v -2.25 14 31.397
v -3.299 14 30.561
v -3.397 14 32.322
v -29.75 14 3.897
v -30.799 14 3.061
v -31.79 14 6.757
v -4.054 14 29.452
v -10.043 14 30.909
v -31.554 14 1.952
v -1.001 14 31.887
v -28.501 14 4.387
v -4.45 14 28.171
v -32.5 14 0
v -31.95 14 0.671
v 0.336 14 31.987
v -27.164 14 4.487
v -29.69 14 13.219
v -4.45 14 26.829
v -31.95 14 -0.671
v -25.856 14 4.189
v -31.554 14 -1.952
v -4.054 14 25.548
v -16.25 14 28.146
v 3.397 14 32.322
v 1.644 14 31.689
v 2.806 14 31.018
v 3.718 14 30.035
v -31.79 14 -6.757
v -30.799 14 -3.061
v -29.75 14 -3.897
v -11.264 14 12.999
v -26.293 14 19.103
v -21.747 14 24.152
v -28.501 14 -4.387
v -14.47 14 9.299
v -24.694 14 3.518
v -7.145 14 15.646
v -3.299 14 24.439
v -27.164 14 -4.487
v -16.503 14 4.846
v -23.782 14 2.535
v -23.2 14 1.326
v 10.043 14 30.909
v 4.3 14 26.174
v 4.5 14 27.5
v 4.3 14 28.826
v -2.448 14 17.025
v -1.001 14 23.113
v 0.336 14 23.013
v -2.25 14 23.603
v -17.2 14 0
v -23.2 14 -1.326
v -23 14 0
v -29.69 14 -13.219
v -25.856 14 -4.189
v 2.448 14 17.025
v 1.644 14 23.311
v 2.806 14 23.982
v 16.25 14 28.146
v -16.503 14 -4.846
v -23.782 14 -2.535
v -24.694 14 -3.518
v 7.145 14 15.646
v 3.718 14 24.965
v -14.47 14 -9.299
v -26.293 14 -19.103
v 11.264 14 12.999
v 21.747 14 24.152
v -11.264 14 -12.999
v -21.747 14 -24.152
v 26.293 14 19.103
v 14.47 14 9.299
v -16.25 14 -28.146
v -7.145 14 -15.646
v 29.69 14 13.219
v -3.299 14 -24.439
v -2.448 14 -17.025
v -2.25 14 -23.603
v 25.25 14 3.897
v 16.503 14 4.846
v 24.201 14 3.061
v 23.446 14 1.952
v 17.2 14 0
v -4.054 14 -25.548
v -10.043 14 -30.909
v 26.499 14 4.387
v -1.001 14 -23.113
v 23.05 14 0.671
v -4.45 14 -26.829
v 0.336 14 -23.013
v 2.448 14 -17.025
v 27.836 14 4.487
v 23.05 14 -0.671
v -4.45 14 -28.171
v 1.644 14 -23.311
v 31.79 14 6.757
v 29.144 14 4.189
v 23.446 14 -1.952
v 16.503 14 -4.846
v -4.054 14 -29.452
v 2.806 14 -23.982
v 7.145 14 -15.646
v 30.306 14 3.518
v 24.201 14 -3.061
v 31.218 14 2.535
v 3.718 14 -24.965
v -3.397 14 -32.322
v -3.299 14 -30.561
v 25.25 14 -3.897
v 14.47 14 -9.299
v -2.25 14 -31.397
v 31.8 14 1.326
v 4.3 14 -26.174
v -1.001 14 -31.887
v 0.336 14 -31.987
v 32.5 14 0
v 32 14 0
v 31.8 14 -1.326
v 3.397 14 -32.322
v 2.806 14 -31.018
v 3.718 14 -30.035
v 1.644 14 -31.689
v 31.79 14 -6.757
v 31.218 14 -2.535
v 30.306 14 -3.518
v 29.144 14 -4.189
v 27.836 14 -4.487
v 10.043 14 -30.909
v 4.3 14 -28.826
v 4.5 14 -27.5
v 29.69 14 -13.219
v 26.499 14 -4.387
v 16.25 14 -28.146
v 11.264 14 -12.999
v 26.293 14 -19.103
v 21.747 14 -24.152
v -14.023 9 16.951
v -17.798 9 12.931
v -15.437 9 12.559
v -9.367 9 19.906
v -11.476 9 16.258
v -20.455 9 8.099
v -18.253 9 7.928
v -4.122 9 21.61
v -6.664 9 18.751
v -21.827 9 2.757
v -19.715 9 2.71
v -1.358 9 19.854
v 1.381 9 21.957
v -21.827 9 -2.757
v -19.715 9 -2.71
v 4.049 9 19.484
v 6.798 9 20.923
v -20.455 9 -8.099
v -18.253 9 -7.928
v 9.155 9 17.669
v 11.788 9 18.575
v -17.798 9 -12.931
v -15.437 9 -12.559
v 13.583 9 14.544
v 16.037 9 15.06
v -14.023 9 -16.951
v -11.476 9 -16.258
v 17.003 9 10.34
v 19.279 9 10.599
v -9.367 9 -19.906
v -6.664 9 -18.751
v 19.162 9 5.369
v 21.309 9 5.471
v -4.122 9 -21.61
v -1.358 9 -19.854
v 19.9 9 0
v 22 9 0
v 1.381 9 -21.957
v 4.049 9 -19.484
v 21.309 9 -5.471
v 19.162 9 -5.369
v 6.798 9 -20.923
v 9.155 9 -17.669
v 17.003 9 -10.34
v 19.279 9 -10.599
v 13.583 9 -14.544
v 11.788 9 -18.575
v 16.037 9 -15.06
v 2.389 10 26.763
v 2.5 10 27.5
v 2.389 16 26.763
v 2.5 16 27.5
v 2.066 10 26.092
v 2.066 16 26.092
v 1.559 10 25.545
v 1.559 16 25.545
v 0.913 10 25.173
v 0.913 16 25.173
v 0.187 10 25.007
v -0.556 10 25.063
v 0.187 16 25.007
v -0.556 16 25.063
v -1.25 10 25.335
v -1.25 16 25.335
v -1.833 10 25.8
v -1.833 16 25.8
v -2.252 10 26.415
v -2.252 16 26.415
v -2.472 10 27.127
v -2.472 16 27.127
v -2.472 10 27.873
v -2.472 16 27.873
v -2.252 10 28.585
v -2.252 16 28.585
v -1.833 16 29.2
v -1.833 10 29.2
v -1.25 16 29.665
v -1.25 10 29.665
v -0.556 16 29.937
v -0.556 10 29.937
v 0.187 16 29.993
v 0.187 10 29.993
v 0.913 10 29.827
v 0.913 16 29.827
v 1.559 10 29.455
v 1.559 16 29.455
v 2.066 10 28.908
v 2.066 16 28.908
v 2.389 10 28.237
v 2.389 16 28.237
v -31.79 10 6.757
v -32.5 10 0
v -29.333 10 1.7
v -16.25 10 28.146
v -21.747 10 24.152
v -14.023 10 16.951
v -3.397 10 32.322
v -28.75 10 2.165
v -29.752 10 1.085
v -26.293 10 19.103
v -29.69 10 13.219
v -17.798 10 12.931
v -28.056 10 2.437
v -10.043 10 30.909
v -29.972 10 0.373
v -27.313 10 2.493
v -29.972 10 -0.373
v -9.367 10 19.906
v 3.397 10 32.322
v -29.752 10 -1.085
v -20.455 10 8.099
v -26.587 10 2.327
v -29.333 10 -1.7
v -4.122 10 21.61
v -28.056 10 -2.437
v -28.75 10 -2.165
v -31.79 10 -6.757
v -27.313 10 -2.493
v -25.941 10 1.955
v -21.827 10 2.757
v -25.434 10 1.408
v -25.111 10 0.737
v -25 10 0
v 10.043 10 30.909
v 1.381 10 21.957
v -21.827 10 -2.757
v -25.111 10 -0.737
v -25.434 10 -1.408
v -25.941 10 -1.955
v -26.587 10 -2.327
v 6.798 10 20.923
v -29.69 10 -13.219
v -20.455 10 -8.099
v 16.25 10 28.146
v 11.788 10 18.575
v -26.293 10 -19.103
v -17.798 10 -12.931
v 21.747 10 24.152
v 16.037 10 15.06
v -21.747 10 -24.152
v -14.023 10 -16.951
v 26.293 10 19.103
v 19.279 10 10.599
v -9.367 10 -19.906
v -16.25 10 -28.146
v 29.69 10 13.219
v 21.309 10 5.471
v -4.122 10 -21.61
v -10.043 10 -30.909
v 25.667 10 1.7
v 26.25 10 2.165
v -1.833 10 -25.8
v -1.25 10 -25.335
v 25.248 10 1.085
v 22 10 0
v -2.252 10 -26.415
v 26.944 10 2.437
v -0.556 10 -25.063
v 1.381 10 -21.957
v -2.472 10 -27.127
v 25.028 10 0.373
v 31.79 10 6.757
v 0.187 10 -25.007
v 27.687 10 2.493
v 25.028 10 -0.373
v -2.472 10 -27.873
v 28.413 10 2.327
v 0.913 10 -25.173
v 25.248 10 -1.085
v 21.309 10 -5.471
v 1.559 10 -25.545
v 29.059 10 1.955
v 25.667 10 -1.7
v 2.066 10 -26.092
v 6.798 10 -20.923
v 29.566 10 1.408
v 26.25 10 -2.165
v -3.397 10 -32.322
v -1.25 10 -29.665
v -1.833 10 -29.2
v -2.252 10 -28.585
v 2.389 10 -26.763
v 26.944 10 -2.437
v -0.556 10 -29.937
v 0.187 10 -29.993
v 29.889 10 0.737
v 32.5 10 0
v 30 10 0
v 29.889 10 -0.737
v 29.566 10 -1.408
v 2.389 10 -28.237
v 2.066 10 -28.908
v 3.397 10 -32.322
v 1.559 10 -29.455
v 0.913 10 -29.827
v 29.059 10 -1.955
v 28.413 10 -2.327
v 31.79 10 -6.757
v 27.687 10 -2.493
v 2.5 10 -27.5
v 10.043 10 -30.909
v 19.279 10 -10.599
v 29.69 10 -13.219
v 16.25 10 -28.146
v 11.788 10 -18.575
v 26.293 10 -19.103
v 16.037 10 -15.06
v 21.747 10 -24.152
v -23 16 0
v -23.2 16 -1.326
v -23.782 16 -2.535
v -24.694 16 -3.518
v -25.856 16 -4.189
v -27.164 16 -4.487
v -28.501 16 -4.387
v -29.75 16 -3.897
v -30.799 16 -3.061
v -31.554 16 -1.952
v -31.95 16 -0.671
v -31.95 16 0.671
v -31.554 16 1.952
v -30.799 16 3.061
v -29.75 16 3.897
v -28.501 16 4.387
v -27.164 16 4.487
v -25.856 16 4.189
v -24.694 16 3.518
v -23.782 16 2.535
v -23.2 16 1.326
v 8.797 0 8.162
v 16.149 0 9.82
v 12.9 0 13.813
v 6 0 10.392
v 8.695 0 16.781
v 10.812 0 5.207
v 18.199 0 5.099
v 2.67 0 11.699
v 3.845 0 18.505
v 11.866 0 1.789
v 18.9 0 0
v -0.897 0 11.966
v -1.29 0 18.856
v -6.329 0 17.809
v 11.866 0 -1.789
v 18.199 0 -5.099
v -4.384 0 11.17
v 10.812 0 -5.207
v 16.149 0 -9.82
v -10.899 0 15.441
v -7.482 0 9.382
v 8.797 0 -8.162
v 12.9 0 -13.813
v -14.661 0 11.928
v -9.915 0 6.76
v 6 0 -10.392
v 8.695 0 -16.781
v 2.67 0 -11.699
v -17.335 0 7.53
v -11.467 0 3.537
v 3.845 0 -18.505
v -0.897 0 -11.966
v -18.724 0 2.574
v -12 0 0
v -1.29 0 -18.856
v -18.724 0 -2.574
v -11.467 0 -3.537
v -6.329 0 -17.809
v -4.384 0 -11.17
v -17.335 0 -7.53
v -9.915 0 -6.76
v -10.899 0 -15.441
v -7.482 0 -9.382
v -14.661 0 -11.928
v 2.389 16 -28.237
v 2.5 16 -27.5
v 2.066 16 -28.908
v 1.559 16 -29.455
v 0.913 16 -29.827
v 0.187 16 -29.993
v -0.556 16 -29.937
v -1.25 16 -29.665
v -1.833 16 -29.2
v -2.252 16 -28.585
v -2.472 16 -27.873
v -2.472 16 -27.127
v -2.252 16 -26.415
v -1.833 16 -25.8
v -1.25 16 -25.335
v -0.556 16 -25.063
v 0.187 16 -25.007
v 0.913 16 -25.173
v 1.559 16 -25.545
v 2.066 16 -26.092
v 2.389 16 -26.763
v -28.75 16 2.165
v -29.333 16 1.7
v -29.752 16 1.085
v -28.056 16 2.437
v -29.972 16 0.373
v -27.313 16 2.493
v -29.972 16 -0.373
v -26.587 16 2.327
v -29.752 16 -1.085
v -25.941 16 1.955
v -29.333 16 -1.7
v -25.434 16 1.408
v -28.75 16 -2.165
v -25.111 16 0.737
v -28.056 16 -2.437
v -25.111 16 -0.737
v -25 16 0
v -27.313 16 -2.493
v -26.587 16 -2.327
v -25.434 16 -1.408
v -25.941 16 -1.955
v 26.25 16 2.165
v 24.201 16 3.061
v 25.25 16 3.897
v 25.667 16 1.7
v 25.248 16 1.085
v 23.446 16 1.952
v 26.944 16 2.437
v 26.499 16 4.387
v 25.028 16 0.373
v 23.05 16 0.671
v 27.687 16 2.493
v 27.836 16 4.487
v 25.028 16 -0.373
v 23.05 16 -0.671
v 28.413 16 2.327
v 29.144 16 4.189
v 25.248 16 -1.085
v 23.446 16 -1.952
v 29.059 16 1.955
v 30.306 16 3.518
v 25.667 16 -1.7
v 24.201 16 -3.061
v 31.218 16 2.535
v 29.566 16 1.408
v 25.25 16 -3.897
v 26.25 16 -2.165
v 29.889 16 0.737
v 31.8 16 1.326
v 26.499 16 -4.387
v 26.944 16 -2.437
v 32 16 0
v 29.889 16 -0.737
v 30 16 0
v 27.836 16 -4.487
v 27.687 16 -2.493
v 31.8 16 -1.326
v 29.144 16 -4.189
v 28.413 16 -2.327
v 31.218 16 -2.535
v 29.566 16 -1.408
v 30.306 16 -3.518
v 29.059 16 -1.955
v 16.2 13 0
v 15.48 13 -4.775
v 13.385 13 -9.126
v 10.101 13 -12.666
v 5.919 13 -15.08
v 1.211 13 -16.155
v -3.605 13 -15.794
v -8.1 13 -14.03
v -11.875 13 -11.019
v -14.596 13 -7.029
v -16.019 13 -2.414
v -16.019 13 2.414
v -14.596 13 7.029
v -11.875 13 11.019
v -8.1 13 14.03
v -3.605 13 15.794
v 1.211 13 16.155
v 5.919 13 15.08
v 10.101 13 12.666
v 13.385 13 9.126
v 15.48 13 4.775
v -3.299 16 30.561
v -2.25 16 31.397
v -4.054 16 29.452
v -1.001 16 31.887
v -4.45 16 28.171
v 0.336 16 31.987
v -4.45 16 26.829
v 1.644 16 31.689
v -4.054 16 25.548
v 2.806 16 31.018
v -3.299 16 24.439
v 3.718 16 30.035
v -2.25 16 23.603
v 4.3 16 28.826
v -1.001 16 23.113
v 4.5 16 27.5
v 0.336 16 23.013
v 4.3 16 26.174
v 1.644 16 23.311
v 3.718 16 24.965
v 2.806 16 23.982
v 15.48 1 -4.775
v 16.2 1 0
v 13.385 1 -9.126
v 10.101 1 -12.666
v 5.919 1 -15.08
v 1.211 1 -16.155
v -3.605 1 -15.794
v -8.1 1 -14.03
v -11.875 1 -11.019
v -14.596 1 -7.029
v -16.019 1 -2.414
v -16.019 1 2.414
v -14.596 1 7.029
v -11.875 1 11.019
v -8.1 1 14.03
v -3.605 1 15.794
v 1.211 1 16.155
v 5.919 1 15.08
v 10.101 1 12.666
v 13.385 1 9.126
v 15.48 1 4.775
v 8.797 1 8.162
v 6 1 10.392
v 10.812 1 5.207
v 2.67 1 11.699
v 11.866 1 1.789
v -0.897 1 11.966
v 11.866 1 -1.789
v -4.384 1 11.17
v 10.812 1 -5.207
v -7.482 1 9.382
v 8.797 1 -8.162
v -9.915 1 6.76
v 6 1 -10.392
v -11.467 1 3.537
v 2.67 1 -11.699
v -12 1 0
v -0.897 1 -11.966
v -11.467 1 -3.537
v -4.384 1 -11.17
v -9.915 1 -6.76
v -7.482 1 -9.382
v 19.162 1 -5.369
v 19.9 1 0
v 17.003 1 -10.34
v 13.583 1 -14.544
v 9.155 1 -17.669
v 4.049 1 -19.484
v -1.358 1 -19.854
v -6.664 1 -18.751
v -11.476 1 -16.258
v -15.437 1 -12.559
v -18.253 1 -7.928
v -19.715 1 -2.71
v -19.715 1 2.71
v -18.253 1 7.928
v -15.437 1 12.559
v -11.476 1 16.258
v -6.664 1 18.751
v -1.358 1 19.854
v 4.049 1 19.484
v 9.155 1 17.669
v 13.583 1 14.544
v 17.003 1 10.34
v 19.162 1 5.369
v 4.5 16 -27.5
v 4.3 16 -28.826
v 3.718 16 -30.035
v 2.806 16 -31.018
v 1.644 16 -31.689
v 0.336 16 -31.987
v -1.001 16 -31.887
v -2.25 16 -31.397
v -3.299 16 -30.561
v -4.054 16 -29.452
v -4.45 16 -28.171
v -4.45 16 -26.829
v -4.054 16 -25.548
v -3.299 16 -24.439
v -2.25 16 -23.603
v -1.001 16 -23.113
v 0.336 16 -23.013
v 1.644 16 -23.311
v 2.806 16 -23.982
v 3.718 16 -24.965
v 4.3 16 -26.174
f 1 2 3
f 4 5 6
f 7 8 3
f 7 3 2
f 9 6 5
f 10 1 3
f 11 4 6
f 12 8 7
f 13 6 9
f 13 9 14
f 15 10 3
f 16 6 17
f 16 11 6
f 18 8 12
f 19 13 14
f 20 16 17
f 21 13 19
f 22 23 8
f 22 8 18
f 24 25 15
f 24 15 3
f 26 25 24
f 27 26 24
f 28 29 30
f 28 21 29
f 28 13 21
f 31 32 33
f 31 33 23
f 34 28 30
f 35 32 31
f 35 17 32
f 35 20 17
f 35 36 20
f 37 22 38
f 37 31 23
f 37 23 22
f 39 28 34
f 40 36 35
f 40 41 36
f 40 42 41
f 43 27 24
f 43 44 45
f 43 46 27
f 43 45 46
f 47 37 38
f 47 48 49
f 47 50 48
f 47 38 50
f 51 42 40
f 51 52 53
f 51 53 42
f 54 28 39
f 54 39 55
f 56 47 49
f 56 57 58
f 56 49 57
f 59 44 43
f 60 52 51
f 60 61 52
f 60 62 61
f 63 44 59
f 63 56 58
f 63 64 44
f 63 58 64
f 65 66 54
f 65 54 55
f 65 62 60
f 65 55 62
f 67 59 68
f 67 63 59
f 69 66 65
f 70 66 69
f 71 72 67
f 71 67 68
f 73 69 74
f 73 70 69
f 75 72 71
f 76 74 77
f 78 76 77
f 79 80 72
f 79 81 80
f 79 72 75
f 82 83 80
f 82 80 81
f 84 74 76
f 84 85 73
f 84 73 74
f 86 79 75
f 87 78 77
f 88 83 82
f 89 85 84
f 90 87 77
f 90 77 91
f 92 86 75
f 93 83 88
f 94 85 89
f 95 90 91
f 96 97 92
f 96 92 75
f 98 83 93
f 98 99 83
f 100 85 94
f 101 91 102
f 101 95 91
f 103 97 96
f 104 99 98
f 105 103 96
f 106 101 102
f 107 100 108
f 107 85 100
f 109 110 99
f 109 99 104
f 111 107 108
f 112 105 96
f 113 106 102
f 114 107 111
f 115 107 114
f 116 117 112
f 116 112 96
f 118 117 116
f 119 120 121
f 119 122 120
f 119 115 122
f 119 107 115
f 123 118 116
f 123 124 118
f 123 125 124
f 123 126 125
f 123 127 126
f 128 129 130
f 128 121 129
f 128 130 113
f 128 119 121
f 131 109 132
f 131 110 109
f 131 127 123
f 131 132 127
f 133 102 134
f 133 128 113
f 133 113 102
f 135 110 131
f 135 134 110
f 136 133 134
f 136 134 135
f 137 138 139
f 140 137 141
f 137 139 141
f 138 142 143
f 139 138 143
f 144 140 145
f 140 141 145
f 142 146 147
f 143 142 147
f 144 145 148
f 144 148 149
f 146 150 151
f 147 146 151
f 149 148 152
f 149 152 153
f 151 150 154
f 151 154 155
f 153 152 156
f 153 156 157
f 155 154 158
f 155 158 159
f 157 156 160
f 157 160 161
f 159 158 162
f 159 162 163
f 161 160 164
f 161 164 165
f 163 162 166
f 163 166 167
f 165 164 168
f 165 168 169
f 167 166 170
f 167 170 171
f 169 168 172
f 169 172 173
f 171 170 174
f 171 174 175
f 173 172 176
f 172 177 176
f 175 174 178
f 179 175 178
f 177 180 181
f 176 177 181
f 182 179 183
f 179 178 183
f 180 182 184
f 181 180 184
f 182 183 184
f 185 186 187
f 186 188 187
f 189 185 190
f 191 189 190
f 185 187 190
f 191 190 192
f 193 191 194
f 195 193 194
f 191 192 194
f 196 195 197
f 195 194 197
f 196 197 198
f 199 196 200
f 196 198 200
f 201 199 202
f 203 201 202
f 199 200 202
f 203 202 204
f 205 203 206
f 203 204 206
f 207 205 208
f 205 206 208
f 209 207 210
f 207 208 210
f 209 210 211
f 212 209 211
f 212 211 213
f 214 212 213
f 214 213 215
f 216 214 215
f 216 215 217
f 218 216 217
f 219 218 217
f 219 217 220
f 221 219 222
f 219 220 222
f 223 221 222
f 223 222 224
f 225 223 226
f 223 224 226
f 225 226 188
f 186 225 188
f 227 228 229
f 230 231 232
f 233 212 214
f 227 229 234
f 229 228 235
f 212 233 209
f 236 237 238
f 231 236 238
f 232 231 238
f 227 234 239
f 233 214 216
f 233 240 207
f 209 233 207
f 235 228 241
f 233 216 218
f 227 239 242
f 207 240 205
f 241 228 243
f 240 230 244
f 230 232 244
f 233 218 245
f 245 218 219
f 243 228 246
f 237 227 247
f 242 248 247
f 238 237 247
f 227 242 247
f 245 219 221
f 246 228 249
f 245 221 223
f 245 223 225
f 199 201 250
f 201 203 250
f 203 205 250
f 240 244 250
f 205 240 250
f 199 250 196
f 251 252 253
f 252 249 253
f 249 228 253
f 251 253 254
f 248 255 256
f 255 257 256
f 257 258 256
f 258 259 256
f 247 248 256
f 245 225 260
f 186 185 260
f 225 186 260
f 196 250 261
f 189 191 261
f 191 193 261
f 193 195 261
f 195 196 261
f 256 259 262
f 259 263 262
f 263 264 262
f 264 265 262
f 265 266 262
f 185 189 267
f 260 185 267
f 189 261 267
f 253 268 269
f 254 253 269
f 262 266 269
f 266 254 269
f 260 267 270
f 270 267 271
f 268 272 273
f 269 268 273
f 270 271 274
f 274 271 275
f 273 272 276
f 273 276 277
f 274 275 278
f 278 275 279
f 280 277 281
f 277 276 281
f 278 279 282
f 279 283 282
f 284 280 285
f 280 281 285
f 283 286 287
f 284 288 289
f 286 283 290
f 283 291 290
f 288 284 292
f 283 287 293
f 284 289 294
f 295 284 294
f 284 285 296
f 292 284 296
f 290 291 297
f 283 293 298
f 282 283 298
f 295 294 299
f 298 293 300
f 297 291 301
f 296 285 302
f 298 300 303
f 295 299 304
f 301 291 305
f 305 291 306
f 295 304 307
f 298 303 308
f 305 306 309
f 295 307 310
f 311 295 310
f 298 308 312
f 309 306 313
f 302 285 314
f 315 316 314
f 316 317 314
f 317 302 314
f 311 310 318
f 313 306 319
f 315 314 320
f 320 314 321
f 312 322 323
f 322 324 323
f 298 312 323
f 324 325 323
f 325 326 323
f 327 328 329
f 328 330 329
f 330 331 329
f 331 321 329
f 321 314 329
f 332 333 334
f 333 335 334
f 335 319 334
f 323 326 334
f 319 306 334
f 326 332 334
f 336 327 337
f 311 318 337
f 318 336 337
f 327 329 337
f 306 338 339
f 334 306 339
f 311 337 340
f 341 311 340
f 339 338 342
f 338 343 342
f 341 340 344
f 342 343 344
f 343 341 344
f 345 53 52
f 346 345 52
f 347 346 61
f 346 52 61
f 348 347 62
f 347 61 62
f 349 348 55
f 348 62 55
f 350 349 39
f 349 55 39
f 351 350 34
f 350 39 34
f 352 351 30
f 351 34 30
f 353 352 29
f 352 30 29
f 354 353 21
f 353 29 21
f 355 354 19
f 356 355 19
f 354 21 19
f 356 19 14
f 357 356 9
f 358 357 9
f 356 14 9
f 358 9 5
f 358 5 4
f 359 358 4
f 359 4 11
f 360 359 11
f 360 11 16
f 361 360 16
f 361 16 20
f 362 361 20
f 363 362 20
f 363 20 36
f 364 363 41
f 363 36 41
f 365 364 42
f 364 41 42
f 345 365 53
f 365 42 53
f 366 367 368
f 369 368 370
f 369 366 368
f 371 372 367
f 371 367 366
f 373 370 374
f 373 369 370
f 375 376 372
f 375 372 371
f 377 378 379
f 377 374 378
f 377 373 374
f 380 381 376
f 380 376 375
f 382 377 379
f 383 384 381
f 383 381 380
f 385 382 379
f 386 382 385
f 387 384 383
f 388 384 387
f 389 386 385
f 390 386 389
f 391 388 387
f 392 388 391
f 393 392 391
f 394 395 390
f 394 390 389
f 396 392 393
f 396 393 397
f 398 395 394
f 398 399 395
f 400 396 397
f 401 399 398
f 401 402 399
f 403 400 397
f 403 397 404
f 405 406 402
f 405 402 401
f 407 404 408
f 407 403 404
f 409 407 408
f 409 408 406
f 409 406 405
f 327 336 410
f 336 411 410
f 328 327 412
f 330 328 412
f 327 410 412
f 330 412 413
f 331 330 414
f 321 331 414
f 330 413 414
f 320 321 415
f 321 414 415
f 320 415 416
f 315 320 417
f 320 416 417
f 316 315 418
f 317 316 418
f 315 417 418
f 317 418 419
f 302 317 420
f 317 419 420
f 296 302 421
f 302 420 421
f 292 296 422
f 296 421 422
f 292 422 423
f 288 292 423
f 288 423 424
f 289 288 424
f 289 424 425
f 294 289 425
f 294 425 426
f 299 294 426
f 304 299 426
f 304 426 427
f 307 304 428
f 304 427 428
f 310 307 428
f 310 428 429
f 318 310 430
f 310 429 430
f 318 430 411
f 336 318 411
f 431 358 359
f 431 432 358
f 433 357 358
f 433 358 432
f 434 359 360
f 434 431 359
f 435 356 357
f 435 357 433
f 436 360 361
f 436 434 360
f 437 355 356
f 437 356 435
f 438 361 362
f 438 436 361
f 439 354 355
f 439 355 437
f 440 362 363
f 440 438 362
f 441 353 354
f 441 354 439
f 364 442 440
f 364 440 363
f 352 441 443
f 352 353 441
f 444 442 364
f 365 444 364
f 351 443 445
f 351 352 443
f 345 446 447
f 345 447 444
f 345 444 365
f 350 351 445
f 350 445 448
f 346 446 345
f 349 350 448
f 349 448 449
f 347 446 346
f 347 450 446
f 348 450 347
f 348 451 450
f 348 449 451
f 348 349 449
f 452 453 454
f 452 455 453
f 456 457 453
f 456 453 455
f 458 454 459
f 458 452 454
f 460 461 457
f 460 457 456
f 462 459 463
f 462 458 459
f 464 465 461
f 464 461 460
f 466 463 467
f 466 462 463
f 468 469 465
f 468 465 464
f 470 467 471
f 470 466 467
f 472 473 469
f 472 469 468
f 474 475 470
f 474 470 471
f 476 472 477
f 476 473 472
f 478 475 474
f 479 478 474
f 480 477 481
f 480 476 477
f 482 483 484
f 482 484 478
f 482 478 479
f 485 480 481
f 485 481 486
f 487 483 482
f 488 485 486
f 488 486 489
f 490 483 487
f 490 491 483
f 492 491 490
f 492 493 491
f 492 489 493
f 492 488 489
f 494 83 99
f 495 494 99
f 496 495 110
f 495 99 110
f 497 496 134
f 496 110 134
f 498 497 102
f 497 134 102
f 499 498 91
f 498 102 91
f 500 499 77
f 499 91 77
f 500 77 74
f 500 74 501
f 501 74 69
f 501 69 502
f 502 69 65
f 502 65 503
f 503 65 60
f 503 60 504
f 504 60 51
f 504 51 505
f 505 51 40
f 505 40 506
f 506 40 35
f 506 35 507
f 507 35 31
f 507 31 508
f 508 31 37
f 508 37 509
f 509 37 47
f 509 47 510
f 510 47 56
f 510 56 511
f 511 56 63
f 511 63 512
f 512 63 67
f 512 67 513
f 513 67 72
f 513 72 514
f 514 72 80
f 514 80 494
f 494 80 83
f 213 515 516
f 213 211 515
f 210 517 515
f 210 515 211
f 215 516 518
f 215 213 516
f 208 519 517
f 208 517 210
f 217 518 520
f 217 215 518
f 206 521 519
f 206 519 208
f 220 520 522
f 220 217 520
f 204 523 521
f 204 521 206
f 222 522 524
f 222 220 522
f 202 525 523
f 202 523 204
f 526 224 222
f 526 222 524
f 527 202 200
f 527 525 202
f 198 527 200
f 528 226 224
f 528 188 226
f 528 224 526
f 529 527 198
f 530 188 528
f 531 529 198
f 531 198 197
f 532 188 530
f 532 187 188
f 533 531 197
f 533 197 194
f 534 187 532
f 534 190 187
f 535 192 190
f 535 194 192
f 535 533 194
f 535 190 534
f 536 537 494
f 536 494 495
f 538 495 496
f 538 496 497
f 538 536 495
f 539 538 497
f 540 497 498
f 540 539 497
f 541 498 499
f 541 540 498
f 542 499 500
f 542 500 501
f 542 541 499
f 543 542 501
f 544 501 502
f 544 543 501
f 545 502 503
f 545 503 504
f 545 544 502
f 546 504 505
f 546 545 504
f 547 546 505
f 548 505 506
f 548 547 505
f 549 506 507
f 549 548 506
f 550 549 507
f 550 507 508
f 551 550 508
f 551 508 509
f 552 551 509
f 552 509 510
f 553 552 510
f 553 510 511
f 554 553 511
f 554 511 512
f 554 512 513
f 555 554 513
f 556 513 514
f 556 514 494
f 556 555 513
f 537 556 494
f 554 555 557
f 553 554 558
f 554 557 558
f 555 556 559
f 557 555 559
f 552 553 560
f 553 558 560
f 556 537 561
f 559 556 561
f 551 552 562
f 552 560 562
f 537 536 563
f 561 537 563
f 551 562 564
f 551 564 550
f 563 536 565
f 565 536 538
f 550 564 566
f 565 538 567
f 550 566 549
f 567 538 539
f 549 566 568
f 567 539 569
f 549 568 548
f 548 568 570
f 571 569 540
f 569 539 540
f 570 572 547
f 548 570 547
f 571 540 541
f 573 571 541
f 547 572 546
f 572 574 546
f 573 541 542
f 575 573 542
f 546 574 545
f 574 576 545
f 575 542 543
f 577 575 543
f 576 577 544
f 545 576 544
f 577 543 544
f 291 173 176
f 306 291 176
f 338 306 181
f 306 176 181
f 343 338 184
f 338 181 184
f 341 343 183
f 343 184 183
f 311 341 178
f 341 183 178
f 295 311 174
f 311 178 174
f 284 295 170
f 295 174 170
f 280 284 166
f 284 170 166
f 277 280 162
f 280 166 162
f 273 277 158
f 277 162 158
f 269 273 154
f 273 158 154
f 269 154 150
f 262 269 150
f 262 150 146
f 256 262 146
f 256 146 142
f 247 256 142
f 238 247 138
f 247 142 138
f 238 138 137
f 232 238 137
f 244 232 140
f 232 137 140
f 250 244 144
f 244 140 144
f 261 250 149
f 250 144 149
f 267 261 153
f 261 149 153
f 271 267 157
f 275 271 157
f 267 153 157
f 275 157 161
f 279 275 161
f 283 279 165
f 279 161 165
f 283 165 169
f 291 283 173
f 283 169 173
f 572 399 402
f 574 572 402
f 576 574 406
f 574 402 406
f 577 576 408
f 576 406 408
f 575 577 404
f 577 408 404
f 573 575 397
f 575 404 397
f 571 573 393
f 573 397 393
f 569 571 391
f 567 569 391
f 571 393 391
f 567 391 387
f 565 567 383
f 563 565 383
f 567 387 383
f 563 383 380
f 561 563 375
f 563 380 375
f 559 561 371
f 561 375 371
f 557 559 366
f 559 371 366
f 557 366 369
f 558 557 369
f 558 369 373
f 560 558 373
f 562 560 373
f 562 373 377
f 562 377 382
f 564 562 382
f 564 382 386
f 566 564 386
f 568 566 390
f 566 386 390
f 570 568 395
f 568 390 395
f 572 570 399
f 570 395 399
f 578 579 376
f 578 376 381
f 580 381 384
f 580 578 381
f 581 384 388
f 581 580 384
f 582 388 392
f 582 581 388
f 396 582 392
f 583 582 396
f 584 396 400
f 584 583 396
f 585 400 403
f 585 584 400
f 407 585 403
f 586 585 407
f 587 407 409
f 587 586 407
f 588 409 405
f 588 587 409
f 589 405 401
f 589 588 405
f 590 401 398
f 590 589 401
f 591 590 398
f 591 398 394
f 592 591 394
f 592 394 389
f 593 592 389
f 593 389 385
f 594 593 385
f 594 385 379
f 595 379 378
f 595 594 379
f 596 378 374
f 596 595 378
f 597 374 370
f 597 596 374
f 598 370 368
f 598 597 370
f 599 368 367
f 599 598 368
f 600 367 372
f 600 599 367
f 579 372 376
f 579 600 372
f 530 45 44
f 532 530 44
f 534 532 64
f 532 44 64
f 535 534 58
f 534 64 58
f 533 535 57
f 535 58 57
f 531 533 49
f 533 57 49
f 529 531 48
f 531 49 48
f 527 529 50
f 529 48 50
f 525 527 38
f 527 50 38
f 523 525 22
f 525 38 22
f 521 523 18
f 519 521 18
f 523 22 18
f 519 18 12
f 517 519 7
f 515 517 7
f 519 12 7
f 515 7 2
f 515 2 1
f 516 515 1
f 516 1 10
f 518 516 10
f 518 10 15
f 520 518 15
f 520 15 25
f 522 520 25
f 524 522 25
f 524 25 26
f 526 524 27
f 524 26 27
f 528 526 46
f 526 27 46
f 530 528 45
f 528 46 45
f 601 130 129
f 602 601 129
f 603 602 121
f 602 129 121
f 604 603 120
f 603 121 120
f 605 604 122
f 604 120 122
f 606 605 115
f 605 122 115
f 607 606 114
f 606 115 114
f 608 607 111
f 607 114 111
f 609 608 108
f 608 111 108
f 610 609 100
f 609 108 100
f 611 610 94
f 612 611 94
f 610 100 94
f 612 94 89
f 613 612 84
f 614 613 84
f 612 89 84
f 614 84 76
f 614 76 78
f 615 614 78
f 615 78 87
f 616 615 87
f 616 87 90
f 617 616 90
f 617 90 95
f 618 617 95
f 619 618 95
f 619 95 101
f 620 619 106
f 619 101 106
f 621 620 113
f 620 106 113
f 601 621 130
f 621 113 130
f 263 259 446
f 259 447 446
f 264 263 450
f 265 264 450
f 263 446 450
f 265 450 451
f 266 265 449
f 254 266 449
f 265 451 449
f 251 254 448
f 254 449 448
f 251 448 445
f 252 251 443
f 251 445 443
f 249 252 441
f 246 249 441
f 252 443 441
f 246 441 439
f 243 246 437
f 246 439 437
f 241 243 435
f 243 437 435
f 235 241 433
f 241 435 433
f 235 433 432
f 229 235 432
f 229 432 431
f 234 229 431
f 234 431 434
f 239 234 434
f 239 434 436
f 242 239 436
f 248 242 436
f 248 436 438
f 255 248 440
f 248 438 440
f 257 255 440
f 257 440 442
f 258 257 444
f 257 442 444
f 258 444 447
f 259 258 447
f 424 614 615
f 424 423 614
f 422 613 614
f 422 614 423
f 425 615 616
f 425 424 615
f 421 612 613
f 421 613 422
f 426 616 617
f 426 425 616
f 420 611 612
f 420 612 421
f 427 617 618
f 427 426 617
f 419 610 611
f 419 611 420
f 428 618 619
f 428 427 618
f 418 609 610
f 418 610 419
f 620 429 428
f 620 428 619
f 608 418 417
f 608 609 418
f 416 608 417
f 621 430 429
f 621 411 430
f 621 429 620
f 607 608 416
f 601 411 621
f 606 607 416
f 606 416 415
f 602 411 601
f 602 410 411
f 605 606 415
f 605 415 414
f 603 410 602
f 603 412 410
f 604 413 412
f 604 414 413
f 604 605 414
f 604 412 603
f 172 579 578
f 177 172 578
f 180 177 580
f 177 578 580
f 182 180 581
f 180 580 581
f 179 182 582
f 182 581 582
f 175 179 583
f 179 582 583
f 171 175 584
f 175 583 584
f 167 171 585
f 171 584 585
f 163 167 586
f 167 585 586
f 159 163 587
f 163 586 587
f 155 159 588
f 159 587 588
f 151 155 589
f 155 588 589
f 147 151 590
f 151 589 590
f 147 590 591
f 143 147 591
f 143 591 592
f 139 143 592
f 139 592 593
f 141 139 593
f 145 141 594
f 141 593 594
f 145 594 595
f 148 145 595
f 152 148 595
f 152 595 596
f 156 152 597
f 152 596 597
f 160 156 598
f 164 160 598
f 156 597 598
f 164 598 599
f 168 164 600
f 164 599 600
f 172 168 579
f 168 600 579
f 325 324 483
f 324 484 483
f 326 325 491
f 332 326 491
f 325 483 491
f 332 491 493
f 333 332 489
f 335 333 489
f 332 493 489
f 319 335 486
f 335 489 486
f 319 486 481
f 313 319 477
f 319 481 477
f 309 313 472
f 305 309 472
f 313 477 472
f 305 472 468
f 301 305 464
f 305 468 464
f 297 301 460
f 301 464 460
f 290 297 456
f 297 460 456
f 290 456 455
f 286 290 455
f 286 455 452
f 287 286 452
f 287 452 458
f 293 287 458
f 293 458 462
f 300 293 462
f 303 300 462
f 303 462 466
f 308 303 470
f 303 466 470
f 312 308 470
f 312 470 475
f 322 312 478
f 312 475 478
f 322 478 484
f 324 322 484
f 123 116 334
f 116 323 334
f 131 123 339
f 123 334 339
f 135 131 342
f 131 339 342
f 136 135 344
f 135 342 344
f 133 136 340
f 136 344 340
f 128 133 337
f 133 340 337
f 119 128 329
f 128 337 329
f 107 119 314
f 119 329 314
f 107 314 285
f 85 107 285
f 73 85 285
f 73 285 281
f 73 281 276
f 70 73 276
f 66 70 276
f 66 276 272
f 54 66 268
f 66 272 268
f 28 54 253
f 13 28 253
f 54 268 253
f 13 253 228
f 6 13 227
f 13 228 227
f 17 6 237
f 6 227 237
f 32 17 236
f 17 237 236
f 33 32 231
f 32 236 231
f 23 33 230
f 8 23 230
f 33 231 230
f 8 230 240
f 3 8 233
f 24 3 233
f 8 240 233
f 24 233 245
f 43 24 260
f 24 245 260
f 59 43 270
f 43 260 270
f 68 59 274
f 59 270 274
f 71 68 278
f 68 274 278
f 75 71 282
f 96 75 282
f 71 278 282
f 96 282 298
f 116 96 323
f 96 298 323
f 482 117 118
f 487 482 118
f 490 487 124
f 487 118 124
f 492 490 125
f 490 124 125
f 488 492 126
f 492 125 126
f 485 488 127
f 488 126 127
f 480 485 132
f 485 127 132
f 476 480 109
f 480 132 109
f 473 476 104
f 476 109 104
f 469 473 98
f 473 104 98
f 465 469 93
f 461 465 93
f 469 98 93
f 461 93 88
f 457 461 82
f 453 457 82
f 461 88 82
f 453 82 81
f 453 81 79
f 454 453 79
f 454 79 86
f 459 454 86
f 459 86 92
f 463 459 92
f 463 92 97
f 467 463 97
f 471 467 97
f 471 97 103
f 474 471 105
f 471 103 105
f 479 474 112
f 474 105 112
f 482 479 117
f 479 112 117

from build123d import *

# Parameters (mm, degrees)
SKETCH1_R           = 19.9
SKETCH1_R_2         = 16.2
BOSS_EXTRUDE1_DEPTH = 9
SKETCH2_R           = 22
SKETCH2_R_2         = 16.2
BOSS_EXTRUDE2_DEPTH = 1
SKETCH3_R           = 32.5
SKETCH3_R_2         = 16.2
BOSS_EXTRUDE3_DEPTH = 1
SKETCH6_R           = 32.5
SKETCH6_R_2         = 2.5
SKETCH6_R_3         = 16.2
BOSS_EXTRUDE6_DEPTH = 3
SKETCH7_R           = 4.5
SKETCH7_R_2         = 2.5
BOSS_EXTRUDE7_DEPTH = 2
SKETCH8_R           = 16.2
SKETCH8_R_2         = 12
BOSS_EXTRUDE8_DEPTH = 1
SKETCH9_R           = 2.5
CUT_EXTRUDE1_DEPTH  = 10
CHAMFER1_SIZE       = 1
CHAMFER2_SIZE       = 1


with BuildPart() as part:
    # Sketch1 → Boss-Extrude1 (new body)
    with BuildSketch(Plane(origin=(0, 0, 0), x_dir=(1, 0, 0), z_dir=(0, 1, 0))):
        Circle(SKETCH1_R)
        Circle(SKETCH1_R_2, mode=Mode.SUBTRACT)
    extrude(amount=BOSS_EXTRUDE1_DEPTH)

    # Sketch2 → Boss-Extrude2 (add)
    with BuildSketch(Plane(origin=(0, 9, 0), x_dir=(1, 0, 0), z_dir=(0, 1, 0))):
        Circle(SKETCH2_R)
        Circle(SKETCH2_R_2, mode=Mode.SUBTRACT)
    extrude(amount=BOSS_EXTRUDE2_DEPTH)

    # Sketch3 → Boss-Extrude3 (add)
    with BuildSketch(Plane(origin=(0, 10, 0), x_dir=(1, 0, 0), z_dir=(0, 1, 0))):
        Circle(SKETCH3_R)
        Circle(SKETCH3_R_2, mode=Mode.SUBTRACT)
    extrude(amount=BOSS_EXTRUDE3_DEPTH)

    # Sketch6 → Boss-Extrude6 (add)
    with BuildSketch(Plane(origin=(0, 11, 0), x_dir=(1, 0, 0), z_dir=(0, 1, 0))):
        Circle(SKETCH6_R)
        with Locations((0, 27.5)):
            Circle(SKETCH6_R_2, mode=Mode.SUBTRACT)
        with Locations((27.5, 0)):
            Circle(SKETCH6_R_2, mode=Mode.SUBTRACT)
        with Locations((0, -27.5)):
            Circle(SKETCH6_R_2, mode=Mode.SUBTRACT)
        with Locations((-27.5, 0)):
            Circle(SKETCH6_R_2, mode=Mode.SUBTRACT)
        Circle(SKETCH6_R_3, mode=Mode.SUBTRACT)
    extrude(amount=BOSS_EXTRUDE6_DEPTH)

    # Sketch7 → Boss-Extrude7 (add)
    with BuildSketch(Plane(origin=(0, 14, 0), x_dir=(1, 0, 0), z_dir=(0, 1, 0))):
        with Locations((0, -27.5)):
            Circle(SKETCH7_R)
        with Locations((0, -27.5)):
            Circle(SKETCH7_R_2, mode=Mode.SUBTRACT)
        with Locations((0, 27.5)):
            Circle(SKETCH7_R)
        with Locations((0, 27.5)):
            Circle(SKETCH7_R_2, mode=Mode.SUBTRACT)
        with Locations((27.5, 0)):
            Circle(SKETCH7_R)
        with Locations((27.5, 0)):
            Circle(SKETCH7_R_2, mode=Mode.SUBTRACT)
        with Locations((-27.5, 0)):
            Circle(SKETCH7_R)
        with Locations((-27.5, 0)):
            Circle(SKETCH7_R_2, mode=Mode.SUBTRACT)
    extrude(amount=BOSS_EXTRUDE7_DEPTH)

    # Sketch8 → Boss-Extrude8 (add)
    with BuildSketch(Plane(origin=(0, 0, 0), x_dir=(-1, 0, 0), z_dir=(0, -1, 0))):
        Circle(SKETCH8_R)
        Circle(SKETCH8_R_2, mode=Mode.SUBTRACT)
    extrude(amount=-BOSS_EXTRUDE8_DEPTH)

    # Sketch9 → Cut-Extrude1 (cut)
    with BuildSketch(Plane(origin=(0, 11, 0), x_dir=(1, 0, 0), z_dir=(0, 1, 0))):
        with Locations((0, -27.5)):
            Circle(SKETCH9_R)
        with Locations((27.5, 0)):
            Circle(SKETCH9_R)
        with Locations((0, 27.5)):
            Circle(SKETCH9_R)
        with Locations((-27.5, 0)):
            Circle(SKETCH9_R)
    extrude(amount=-CUT_EXTRUDE1_DEPTH, mode=Mode.SUBTRACT)

    # Chamfer1
    chamfer1_edges = [part.edges().sort_by_distance(p)[0] for p in [
        (-16.2, 14, 0),
    ]]
    chamfer(chamfer1_edges, length=CHAMFER1_SIZE)

    # Chamfer2
    chamfer2_edges = [part.edges().sort_by_distance(p)[0] for p in [
        (-19.9, 0, 0),
    ]]
    chamfer(chamfer2_edges, length=CHAMFER2_SIZE)


solid = part.part
